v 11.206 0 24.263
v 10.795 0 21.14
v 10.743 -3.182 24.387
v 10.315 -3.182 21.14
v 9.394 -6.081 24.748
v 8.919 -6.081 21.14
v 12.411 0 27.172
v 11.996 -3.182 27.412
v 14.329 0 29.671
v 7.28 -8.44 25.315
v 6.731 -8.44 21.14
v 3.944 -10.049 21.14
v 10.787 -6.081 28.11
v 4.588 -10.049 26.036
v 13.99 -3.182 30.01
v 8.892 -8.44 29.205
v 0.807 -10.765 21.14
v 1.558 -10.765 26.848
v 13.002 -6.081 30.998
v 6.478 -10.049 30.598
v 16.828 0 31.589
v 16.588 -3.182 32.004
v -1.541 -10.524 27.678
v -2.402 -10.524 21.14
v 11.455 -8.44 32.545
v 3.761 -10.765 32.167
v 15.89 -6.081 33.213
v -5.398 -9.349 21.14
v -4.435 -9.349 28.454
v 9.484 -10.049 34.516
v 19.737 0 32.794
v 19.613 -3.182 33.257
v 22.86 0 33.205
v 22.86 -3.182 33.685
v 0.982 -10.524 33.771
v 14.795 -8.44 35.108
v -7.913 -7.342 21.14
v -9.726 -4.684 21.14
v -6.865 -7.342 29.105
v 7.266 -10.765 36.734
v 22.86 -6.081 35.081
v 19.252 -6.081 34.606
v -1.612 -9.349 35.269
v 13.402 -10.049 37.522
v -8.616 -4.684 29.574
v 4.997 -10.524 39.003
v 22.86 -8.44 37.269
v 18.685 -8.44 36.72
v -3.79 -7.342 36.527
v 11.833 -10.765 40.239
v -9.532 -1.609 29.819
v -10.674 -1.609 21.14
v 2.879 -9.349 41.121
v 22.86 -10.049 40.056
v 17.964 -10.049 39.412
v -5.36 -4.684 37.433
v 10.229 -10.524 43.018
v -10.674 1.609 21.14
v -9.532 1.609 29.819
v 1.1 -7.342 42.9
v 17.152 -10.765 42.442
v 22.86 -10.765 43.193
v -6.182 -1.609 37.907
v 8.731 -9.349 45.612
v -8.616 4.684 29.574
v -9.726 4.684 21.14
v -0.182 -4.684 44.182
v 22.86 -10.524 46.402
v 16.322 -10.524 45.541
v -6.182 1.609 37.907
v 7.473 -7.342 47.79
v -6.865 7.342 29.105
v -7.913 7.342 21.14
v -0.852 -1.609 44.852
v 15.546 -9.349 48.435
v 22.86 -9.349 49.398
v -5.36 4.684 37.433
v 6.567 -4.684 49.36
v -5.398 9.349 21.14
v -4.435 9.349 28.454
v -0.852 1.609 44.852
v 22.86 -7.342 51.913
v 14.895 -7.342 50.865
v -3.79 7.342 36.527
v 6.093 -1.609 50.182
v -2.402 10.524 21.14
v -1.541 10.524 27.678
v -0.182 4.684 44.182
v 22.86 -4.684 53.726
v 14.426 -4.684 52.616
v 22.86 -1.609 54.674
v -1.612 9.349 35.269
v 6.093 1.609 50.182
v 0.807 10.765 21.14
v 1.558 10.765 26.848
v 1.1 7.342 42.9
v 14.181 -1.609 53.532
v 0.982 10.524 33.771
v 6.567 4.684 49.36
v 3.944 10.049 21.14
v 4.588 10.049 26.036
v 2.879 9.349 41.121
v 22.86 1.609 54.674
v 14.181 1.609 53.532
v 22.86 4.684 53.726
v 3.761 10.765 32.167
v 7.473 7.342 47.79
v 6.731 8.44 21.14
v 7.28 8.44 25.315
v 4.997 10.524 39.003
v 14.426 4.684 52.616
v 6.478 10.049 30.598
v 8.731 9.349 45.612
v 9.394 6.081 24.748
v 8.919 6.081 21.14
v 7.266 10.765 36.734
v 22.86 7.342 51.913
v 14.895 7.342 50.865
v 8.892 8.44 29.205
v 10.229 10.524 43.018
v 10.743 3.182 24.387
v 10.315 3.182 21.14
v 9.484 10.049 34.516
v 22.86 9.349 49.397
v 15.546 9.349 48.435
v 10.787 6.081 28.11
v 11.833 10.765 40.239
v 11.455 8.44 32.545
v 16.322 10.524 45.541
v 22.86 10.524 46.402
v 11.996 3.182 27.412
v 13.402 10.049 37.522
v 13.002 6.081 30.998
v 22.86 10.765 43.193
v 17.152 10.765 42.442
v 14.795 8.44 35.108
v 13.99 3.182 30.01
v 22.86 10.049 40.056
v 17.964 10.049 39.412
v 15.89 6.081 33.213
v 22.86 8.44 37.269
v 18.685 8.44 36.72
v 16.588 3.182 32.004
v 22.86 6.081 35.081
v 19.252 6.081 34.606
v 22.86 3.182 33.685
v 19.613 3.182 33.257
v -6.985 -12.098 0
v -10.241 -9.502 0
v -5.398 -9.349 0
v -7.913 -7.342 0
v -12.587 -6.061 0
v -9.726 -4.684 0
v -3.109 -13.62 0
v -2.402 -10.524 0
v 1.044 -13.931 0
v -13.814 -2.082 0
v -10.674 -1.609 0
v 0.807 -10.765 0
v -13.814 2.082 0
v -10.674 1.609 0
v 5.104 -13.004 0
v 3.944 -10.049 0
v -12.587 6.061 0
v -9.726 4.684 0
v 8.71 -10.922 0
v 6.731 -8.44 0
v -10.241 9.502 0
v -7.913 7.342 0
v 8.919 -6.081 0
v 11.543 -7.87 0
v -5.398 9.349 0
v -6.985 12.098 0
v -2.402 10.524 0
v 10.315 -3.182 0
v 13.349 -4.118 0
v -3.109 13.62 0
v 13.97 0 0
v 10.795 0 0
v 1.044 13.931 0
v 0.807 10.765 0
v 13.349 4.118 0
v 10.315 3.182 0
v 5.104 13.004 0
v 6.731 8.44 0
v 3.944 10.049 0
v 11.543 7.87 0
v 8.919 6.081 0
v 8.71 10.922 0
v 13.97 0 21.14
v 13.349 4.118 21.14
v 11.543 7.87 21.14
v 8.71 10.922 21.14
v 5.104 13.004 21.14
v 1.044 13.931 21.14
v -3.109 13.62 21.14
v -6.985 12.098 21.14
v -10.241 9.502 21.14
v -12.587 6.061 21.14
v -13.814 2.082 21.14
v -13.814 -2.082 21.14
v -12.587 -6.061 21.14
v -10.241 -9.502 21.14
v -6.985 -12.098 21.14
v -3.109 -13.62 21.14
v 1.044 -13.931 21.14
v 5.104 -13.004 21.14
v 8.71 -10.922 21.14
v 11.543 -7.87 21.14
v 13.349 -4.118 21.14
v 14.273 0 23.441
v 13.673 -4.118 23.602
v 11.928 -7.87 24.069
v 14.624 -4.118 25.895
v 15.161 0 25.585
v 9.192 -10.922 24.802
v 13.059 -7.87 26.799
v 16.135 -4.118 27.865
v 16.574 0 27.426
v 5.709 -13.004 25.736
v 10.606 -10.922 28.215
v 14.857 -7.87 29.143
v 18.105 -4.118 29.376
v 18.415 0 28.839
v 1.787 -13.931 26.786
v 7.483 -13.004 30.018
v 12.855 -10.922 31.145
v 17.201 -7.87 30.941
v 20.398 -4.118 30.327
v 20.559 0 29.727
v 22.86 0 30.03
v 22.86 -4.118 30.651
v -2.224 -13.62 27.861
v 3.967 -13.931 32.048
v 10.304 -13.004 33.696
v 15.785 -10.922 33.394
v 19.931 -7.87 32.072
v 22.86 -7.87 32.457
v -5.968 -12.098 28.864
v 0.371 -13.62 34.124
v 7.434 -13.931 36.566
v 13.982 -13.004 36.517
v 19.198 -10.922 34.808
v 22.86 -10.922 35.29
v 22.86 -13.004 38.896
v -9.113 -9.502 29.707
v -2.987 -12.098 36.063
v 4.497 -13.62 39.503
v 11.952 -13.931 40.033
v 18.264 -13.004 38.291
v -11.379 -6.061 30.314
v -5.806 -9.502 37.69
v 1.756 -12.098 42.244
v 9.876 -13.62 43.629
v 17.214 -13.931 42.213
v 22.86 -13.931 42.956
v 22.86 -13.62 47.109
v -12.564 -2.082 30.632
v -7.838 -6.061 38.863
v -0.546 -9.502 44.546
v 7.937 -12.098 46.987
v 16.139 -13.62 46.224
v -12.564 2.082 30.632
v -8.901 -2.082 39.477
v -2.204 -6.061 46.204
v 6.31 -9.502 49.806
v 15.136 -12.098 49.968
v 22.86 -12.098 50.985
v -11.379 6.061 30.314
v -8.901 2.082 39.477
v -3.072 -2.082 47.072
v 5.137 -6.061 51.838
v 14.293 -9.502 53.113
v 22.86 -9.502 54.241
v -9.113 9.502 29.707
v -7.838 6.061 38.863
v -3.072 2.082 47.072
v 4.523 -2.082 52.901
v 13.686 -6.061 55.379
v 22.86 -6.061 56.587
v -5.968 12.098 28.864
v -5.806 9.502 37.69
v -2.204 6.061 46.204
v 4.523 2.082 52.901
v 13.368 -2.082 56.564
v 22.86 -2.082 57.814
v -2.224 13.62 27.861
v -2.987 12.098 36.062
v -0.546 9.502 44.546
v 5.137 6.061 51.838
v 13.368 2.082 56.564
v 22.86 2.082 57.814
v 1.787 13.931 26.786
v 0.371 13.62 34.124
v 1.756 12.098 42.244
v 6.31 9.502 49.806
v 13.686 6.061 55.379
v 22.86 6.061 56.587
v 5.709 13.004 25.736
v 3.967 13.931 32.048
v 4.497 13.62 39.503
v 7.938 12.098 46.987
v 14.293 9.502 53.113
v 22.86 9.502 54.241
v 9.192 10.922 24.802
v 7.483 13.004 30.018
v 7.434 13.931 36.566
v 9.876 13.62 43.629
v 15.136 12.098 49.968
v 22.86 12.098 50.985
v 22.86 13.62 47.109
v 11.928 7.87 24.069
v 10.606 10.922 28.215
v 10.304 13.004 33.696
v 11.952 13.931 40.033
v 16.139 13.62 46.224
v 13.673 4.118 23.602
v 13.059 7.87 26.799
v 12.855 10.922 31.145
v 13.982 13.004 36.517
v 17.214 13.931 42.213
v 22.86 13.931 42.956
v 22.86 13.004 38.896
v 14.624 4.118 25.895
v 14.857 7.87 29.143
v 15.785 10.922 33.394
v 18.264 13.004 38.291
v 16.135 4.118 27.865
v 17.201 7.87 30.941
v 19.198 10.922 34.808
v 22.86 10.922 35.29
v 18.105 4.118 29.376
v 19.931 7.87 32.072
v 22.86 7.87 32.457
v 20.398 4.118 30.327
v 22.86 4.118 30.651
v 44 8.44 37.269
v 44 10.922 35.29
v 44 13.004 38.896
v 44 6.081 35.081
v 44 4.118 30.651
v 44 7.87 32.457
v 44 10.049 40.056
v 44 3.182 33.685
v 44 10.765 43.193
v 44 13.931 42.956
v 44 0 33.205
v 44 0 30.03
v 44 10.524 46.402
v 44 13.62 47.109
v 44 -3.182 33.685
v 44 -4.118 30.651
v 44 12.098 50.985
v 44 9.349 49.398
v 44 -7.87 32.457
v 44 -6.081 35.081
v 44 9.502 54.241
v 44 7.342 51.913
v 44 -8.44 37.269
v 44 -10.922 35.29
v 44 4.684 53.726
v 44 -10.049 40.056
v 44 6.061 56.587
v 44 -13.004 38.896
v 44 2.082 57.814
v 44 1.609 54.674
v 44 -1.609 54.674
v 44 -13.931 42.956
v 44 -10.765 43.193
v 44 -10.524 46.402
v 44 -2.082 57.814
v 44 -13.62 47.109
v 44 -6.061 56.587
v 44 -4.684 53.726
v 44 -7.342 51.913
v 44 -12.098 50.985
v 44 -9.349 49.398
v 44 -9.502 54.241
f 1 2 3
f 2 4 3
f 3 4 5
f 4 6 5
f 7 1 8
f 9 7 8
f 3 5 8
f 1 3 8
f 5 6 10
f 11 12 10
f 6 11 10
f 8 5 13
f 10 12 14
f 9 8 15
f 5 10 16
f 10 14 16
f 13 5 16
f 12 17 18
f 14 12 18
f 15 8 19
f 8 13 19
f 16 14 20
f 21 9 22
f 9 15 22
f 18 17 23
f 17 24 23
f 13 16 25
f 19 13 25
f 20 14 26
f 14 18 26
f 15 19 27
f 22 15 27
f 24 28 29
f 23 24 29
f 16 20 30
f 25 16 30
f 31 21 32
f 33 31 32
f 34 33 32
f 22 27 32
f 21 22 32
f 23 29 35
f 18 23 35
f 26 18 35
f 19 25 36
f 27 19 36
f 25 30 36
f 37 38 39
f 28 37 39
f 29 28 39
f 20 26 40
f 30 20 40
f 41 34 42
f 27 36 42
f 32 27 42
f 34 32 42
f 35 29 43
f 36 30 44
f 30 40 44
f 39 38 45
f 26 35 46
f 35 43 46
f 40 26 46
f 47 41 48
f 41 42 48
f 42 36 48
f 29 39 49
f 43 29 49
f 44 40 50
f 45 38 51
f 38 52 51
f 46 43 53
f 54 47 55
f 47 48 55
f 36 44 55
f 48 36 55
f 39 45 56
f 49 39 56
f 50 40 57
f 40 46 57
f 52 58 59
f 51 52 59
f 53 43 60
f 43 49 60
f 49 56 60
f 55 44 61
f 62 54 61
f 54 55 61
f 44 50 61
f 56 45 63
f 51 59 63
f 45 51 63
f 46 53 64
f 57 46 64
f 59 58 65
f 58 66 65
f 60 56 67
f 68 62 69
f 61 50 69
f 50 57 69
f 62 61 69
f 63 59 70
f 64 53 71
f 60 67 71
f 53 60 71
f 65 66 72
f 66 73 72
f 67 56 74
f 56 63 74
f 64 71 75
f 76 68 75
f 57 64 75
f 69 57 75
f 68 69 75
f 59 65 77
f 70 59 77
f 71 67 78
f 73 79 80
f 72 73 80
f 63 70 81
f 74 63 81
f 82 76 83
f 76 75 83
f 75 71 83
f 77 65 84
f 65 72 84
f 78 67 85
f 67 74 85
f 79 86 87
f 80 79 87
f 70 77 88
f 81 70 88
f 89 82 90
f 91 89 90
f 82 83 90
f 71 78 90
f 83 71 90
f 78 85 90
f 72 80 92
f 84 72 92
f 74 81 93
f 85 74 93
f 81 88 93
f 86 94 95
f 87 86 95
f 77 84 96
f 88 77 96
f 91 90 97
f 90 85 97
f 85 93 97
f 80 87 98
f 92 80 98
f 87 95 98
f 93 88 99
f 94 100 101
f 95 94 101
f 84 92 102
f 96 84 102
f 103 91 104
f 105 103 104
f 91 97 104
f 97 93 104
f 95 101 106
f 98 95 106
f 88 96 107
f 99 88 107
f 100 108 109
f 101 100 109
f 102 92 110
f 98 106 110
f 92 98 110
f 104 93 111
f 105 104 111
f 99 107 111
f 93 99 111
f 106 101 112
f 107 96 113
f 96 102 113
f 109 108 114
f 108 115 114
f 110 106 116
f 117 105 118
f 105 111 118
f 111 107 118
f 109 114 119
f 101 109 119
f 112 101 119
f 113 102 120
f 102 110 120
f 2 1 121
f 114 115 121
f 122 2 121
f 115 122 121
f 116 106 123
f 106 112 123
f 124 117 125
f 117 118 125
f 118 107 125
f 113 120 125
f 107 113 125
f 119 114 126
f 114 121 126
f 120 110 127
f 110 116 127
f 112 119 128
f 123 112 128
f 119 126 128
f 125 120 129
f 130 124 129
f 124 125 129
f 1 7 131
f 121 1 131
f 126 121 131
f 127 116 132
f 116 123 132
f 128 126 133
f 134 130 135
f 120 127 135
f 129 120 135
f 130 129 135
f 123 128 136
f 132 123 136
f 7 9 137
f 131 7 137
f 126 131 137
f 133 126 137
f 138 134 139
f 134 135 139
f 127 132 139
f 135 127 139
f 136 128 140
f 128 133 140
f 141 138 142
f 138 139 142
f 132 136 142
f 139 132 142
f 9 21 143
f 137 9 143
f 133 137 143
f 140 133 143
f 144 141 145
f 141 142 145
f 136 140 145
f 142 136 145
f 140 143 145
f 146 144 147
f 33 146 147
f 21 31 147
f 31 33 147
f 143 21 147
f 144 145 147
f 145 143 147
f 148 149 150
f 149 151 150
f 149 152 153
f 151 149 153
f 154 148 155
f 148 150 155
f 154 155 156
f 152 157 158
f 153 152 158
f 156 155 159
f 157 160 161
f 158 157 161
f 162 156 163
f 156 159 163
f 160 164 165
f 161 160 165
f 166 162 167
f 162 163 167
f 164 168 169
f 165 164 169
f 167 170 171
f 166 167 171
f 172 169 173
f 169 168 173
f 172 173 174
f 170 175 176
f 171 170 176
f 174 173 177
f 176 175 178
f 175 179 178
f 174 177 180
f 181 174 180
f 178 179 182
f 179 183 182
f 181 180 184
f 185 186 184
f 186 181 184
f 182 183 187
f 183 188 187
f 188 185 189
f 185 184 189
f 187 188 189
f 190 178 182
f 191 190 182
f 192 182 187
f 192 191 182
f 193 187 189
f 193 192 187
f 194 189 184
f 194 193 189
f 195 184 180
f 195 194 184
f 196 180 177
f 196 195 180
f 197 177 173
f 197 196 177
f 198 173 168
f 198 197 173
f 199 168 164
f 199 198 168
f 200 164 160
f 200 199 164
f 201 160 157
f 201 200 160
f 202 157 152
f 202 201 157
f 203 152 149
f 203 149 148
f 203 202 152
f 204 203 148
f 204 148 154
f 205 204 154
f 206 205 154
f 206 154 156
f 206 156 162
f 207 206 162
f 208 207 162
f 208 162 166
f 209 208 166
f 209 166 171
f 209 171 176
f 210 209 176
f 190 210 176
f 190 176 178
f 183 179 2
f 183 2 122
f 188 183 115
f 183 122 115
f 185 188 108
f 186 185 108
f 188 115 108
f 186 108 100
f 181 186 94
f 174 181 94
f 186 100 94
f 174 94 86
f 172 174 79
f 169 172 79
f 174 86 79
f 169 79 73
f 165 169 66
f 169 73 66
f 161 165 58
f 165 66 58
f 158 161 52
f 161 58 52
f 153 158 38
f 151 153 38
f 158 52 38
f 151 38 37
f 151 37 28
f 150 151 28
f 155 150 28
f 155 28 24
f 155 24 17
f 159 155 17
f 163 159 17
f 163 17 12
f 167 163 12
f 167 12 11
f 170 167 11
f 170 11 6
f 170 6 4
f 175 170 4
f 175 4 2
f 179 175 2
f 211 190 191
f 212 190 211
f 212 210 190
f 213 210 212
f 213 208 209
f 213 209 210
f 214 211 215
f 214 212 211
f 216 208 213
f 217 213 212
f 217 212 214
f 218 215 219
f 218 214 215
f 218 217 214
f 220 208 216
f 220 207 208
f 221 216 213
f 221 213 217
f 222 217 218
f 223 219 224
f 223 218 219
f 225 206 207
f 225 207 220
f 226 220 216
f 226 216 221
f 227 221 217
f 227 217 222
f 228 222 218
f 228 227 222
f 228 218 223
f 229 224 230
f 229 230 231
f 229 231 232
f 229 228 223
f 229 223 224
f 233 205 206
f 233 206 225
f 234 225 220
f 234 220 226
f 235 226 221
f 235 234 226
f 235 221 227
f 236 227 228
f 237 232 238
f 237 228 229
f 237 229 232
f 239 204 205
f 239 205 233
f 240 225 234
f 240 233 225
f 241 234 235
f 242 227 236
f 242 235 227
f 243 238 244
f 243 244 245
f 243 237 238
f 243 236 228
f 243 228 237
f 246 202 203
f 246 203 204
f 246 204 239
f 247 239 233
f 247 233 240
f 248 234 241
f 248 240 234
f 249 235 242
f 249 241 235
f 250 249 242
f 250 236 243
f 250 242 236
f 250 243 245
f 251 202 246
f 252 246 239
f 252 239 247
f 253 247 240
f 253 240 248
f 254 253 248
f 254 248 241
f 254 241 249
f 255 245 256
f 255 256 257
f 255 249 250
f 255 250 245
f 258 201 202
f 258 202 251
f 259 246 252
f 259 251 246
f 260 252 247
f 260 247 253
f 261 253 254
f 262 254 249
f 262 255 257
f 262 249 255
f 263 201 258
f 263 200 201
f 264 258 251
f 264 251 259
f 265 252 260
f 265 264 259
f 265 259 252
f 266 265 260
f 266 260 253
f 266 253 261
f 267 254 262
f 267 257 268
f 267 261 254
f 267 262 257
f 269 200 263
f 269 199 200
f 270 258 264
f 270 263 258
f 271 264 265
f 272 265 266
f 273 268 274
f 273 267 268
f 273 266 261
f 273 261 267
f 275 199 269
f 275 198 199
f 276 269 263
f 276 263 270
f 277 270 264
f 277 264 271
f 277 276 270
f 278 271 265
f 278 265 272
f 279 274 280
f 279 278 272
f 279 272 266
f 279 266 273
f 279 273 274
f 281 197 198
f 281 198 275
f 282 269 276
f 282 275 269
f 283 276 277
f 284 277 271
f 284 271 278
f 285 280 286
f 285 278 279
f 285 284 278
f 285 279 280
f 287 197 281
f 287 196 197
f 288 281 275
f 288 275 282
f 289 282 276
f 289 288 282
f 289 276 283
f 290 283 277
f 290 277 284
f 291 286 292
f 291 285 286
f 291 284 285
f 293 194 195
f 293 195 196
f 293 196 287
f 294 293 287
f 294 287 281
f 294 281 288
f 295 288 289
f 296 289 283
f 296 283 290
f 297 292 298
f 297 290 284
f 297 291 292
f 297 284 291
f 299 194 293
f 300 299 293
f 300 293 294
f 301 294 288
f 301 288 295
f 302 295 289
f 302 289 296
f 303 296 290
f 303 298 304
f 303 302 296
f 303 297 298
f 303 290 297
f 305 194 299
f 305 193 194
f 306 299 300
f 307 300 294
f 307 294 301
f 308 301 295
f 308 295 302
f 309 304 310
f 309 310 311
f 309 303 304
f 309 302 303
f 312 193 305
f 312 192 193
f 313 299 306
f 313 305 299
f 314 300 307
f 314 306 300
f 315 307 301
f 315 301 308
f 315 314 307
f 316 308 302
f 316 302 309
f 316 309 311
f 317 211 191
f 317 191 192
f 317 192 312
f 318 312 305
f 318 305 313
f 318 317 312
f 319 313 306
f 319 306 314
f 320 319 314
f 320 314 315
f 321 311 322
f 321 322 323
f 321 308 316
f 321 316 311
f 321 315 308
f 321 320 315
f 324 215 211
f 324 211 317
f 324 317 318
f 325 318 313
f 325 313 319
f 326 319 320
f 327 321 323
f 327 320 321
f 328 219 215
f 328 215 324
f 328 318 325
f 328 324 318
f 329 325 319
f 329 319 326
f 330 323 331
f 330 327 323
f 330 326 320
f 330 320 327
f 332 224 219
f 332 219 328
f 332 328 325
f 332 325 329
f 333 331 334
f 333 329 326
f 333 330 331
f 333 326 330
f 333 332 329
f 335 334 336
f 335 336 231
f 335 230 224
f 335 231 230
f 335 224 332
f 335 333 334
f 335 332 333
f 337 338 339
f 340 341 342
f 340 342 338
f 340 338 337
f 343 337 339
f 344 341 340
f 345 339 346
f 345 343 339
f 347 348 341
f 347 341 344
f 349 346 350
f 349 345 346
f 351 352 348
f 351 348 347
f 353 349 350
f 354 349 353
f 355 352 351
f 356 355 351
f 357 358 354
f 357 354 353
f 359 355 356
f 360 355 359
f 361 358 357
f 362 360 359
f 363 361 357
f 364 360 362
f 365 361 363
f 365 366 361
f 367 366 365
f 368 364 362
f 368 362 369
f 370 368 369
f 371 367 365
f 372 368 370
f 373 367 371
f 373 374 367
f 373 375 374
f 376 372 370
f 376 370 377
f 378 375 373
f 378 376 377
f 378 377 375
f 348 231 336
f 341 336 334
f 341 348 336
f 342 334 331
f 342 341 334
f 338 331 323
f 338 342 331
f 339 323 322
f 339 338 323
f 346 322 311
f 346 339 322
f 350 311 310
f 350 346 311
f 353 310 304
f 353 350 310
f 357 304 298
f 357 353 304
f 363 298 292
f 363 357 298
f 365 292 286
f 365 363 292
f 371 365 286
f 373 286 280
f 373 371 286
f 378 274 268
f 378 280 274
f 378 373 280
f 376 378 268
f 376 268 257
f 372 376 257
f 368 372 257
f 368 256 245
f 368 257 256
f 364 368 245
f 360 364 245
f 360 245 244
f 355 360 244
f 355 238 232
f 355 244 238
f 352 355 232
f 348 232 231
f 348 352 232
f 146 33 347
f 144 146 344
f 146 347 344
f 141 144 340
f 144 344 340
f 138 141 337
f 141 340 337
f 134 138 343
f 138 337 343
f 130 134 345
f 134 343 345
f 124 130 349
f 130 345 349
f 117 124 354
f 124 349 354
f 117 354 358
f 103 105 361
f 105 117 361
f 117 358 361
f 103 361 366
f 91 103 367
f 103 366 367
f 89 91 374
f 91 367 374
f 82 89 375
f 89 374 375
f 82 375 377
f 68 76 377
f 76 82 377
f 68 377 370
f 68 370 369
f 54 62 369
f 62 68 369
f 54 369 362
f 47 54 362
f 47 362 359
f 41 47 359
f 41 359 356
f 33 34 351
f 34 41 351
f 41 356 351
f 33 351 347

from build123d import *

# Parameters (mm, degrees)
F1_R = 13.97
F3_R = 10.795


with BuildPart() as f2:
    # F2: sweep along a path in F0
    with BuildLine(Plane.XZ) as f2_path:
        Line((0, 0), (0, 21.14))
        ThreePointArc((0, 21.14), (6.6955389821, 37.3044610179), (22.86, 44))
        Line((22.86, 44), (44, 44))
    # F1 (on Top) → F2 (sweep)
    with BuildSketch(Plane.XY):
        Circle(F1_R)
    sweep(path=f2_path.line)

    # F4: sweep along a path in F0
    with BuildLine(Plane.XZ) as f4_path:
        Line((0, 0), (0, 21.14))
        ThreePointArc((0, 21.14), (6.6955389821, 37.3044610179), (22.86, 44))
        Line((22.86, 44), (44, 44))
    # F3 (on face) → F4 (sweep, cut)
    with BuildSketch(Plane(origin=(0, 0, 0), x_dir=(1, 0, 0), z_dir=(0, 0, -1))):
        Circle(F3_R)
    sweep(path=f4_path.line, mode=Mode.SUBTRACT)


solid = f2.part
